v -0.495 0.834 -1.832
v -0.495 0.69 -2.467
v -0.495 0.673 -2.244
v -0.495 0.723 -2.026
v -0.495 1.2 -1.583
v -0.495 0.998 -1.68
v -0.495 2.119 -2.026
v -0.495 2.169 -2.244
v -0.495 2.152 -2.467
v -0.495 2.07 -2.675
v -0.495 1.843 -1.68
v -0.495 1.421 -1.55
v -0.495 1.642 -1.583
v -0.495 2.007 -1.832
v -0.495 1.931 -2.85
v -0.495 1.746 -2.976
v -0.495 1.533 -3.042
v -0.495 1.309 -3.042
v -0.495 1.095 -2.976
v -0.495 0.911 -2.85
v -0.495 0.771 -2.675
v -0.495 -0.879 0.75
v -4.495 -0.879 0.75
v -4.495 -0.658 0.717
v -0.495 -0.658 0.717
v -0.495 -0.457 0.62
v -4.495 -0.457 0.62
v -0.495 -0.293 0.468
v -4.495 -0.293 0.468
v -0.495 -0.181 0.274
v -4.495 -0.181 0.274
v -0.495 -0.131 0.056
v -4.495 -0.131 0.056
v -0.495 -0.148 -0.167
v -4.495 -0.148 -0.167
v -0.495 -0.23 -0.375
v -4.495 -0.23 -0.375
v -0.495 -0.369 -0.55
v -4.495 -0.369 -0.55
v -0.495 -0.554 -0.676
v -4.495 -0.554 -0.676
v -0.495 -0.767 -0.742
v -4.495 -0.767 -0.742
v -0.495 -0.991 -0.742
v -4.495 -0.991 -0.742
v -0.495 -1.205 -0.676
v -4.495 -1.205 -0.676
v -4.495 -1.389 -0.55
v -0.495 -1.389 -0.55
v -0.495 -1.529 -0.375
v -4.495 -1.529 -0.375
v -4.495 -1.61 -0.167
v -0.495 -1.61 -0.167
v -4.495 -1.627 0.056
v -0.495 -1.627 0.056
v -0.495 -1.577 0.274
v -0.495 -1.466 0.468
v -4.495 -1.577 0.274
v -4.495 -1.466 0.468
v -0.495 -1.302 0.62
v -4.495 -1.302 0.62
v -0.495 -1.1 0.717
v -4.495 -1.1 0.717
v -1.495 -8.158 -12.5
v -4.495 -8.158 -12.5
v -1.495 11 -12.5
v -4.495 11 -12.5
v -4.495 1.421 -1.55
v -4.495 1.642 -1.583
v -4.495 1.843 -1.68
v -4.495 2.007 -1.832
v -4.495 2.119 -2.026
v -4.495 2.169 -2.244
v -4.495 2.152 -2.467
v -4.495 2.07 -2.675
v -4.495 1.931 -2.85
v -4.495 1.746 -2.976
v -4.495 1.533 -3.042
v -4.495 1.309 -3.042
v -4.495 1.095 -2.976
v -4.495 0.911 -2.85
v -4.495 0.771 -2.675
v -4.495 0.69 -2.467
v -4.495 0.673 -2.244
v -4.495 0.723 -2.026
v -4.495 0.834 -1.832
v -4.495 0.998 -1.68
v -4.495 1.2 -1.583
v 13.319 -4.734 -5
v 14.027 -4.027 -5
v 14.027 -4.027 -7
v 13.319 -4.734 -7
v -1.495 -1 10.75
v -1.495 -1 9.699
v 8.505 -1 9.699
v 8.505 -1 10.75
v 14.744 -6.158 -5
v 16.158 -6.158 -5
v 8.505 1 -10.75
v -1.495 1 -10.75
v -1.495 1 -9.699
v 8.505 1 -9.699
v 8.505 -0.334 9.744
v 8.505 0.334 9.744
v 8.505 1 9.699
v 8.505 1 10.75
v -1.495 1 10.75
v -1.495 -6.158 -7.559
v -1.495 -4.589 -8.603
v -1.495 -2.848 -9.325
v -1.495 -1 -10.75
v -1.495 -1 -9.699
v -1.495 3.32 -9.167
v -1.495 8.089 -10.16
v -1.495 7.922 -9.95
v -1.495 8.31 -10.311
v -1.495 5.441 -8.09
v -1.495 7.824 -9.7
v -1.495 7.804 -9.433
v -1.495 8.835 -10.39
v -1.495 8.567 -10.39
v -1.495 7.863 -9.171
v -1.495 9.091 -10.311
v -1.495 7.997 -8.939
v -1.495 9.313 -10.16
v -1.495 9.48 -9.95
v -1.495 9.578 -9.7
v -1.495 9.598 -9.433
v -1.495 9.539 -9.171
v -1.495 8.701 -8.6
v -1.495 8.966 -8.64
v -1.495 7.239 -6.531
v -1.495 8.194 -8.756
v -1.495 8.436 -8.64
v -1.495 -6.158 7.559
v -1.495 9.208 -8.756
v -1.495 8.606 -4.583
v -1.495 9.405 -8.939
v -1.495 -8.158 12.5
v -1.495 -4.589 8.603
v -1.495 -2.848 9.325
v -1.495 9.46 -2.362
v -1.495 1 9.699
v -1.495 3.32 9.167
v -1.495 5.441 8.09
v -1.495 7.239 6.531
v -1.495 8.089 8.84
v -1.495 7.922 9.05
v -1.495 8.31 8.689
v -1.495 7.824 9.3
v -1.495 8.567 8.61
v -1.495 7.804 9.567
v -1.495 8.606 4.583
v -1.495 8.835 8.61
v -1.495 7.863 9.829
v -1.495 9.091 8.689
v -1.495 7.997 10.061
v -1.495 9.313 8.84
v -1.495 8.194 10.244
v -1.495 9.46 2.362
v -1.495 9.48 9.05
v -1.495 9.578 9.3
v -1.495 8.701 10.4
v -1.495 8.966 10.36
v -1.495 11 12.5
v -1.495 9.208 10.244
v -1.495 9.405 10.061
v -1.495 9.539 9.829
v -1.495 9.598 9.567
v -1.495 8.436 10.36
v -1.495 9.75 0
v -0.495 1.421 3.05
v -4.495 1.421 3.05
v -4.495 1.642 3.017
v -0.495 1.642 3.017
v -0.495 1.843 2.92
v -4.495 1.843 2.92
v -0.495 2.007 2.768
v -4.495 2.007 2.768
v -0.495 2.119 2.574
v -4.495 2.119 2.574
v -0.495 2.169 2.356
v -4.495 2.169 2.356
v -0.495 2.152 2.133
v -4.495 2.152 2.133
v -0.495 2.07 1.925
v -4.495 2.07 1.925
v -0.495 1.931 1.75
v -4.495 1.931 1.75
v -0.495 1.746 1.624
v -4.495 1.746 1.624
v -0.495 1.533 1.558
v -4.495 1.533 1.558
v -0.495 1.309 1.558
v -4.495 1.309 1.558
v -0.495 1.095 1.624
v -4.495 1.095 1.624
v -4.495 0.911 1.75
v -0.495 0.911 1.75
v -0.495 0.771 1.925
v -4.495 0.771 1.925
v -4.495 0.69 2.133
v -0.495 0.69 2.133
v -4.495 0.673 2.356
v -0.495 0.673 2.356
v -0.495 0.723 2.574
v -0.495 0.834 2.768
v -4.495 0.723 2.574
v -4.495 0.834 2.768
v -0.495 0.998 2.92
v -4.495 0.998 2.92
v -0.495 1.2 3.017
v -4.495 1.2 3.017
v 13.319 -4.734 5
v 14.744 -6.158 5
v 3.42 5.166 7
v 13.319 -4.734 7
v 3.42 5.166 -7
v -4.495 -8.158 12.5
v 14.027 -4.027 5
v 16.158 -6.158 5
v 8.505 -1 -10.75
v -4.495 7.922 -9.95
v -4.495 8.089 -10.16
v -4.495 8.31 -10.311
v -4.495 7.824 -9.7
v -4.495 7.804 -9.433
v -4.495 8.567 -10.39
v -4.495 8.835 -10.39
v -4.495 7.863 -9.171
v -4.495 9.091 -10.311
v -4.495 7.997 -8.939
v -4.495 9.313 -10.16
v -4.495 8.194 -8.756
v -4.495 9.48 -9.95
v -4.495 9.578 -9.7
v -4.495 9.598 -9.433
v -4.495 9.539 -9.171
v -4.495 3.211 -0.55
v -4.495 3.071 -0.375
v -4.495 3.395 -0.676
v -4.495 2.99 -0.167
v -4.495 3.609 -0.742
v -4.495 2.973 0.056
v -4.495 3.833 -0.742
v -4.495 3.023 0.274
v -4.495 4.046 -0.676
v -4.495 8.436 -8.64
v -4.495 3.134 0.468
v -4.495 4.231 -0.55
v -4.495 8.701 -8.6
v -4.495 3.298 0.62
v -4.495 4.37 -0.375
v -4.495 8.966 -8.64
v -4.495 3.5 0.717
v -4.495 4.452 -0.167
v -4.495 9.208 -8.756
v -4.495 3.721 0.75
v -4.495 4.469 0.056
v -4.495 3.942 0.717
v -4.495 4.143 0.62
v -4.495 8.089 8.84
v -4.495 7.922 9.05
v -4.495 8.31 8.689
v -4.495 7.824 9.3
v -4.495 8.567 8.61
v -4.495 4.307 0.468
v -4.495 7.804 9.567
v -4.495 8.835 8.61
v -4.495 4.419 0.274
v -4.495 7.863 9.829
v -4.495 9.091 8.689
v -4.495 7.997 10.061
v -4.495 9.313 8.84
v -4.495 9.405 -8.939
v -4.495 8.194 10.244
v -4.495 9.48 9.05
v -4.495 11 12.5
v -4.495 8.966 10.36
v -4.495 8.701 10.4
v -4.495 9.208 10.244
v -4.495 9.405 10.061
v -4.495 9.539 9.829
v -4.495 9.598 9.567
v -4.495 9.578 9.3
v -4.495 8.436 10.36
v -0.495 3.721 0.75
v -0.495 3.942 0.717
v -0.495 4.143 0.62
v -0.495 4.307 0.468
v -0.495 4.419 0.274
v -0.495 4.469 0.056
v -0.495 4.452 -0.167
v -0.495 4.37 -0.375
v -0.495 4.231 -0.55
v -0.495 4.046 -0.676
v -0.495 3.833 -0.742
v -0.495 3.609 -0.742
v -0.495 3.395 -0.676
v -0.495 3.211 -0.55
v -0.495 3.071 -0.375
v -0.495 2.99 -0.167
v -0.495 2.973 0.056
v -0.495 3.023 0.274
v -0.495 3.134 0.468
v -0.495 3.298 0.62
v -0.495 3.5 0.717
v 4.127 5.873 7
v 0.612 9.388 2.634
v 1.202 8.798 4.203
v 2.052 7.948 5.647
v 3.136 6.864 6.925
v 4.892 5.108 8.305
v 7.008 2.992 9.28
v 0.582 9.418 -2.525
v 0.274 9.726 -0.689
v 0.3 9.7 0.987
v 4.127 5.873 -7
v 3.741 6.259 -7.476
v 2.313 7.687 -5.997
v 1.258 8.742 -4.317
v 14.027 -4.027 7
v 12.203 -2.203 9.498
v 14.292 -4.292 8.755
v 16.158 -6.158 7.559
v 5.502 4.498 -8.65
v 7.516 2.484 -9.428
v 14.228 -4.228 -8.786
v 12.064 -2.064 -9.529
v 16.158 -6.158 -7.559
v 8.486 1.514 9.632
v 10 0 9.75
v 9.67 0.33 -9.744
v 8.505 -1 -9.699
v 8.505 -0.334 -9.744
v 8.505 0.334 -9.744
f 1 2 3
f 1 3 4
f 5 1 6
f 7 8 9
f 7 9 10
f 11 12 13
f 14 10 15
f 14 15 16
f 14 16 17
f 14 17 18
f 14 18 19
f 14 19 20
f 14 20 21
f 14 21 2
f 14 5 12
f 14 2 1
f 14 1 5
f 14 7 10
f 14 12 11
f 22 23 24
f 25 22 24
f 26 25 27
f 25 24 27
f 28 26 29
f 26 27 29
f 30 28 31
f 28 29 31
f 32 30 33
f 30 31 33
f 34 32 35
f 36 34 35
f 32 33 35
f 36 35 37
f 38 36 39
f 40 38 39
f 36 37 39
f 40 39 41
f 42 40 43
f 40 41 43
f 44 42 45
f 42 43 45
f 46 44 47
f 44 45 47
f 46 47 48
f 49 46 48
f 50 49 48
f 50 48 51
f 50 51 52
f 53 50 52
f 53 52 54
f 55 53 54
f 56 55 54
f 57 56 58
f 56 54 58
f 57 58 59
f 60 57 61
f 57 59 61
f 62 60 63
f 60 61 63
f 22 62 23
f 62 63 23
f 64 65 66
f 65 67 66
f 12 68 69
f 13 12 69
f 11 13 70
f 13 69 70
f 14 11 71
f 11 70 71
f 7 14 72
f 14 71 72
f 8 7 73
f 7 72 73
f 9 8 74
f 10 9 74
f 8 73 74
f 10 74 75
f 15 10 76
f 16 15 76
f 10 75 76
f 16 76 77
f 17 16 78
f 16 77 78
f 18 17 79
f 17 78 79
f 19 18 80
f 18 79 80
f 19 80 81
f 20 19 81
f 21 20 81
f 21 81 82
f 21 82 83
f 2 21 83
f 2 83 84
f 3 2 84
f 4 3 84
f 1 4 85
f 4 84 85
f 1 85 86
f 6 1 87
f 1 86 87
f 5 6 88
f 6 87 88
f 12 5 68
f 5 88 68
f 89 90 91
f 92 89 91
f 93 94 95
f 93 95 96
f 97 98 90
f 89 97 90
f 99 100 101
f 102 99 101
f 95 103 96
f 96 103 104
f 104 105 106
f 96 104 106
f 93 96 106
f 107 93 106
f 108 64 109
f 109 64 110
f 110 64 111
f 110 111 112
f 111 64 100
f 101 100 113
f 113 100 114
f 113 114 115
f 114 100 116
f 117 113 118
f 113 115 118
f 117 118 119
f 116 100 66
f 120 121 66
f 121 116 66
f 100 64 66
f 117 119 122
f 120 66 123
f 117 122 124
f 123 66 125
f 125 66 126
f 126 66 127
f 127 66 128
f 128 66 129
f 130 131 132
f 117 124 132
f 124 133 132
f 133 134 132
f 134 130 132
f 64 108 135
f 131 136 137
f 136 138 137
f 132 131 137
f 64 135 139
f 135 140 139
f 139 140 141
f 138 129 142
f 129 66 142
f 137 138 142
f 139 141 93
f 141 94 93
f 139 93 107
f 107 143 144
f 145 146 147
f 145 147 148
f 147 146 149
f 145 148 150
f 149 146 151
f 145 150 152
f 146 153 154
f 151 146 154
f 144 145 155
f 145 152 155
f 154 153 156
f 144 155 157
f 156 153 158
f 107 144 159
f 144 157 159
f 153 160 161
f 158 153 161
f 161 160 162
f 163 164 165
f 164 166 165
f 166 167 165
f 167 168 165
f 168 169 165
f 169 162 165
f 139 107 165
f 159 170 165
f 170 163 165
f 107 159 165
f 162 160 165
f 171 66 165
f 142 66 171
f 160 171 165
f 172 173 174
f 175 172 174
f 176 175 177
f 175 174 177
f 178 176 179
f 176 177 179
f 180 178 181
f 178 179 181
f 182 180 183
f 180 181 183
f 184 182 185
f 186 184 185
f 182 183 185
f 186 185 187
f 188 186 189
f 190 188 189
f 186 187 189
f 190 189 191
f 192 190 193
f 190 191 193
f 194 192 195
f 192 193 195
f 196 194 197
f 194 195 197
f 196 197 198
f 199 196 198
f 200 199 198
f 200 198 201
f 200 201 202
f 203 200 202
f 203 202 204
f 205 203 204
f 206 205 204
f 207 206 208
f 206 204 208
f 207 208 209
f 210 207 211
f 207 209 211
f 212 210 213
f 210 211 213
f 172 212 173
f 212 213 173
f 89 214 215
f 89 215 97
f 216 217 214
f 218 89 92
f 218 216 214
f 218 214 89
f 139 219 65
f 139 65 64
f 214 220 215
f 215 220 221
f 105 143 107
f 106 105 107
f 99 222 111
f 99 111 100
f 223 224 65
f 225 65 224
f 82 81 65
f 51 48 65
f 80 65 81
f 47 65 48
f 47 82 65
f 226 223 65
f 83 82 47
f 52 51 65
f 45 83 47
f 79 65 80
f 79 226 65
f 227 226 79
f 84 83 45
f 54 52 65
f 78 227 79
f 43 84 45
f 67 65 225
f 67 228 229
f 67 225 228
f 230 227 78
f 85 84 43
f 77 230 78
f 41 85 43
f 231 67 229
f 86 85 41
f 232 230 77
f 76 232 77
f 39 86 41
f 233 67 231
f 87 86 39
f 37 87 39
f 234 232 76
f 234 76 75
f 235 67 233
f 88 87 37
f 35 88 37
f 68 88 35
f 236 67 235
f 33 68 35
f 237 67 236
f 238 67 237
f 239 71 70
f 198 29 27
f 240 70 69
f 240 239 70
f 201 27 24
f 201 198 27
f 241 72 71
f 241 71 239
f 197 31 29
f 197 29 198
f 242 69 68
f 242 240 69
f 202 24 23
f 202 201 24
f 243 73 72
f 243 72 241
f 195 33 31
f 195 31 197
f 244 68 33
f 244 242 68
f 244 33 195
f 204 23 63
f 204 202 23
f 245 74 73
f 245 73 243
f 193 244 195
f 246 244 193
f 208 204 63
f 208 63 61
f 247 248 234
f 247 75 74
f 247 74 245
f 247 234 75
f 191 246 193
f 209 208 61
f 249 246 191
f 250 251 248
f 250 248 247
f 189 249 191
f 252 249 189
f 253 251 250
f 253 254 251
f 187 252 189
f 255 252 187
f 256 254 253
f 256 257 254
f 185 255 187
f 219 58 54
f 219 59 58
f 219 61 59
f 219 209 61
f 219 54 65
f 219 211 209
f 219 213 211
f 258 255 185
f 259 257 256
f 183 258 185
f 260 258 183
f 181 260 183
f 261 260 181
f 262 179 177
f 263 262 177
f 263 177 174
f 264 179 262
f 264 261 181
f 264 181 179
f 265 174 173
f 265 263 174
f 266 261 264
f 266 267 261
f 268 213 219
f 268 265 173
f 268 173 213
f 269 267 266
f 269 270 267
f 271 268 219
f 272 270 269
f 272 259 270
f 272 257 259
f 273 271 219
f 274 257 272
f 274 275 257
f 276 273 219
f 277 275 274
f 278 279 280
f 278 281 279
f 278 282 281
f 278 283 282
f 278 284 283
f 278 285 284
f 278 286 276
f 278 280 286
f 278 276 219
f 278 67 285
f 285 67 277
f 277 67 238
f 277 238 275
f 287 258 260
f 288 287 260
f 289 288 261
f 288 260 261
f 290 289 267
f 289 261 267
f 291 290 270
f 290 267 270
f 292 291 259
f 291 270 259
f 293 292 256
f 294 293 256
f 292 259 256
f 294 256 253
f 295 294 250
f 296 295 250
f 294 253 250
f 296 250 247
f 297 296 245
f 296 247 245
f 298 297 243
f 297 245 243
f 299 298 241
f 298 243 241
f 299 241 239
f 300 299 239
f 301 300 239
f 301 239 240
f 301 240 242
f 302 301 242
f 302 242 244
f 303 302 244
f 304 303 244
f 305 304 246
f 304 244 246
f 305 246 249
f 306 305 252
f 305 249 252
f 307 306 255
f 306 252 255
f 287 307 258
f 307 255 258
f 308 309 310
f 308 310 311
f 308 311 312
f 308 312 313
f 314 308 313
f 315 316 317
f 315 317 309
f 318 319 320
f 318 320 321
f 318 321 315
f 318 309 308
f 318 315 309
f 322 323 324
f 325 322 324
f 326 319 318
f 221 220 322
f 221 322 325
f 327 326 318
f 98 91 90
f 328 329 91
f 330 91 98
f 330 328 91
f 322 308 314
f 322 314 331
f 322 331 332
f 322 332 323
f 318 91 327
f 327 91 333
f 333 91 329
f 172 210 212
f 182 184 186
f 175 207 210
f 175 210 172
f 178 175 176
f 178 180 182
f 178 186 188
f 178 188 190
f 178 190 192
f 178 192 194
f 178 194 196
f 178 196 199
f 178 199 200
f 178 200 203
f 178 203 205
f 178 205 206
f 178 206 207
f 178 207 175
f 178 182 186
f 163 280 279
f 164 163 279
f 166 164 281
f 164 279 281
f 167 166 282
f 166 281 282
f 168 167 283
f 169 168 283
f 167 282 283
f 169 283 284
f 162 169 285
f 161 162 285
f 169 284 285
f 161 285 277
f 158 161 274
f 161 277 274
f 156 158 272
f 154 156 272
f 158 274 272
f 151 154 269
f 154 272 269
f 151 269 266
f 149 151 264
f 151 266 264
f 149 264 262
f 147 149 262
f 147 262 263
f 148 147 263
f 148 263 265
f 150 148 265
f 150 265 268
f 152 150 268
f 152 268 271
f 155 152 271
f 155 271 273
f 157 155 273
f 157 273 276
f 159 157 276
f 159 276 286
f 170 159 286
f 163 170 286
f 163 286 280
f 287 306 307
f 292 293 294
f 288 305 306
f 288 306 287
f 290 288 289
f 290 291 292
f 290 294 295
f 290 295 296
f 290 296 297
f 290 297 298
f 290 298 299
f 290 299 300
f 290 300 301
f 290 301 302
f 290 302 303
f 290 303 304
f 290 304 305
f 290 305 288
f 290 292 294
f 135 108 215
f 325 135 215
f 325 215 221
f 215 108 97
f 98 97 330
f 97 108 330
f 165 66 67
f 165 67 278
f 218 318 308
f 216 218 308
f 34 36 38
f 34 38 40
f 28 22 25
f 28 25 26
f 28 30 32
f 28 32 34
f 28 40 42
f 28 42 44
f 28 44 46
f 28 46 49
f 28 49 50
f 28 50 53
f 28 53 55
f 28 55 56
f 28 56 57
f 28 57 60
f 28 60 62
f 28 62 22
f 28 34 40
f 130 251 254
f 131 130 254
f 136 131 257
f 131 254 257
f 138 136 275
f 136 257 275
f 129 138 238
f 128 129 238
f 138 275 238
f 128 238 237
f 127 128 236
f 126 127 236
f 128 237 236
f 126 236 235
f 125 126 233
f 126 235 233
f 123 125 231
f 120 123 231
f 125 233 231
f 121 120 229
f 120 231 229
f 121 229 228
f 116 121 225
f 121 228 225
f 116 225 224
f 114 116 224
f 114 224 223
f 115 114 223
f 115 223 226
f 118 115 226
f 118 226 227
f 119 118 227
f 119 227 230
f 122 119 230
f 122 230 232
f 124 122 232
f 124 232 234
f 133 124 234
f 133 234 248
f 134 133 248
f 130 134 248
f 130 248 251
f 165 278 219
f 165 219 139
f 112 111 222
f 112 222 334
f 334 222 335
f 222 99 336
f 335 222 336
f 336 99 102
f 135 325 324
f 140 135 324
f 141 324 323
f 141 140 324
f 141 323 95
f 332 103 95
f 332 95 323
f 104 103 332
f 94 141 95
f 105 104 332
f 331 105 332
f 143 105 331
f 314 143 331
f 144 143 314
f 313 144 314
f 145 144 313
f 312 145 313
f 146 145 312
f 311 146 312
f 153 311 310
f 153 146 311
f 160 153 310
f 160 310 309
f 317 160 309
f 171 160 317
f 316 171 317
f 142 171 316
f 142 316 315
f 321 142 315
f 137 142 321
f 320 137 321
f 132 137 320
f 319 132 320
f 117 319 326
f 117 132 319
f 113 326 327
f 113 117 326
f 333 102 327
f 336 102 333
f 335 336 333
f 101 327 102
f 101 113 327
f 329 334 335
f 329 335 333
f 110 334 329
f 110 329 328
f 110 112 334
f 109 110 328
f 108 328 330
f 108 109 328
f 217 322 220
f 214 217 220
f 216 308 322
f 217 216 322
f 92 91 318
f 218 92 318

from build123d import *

# Parameters (mm, degrees)
SKETCH_1_W               = 31.418685122
SKETCH_1_H               = 20
EXTRUDE_1_DEPTH          = 20
CUT_EXTRUDE_1_DEPTH      = 40
SKETCH_5_OUTSIDE_W       = 44.348
SKETCH_5_OUTSIDE_H       = 32.93
SKETCH_5_OUTSIDE_R       = 9.75
CUT_EXTRUDE_2_DEPTH      = 45.122368972
CUT_EXTRUDE_3_DEPTH      = 1
SKETCH_6_R               = 9.75
CUT_EXTRUDE_4_DEPTH      = 18.50523648
SKETCH_7_W               = 25
SKETCH_7_H               = 22
EXTRUDE_2_DEPTH          = 3
CUT_EXTRUDE_5_DEPTH      = 25.793531221
CUT_EXTRUDE_5_DEPTH_BACK = 25.793531221
SKETCH_8_W               = 31.739015686
SKETCH_8_H               = 6.741185812
SKETCH_9_W               = 2
SKETCH_9_H               = 2
EXTRUDE_3_DEPTH          = 13
SKETCH_10_W              = 3
SKETCH_10_H              = 25
EXTRUDE_4_DEPTH          = 2
SKETCH_11_R              = 0.75
CUT_EXTRUDE_6_DEPTH      = 4
SKETCH_13_R              = 0.9
CUT_EXTRUDE_7_DEPTH      = 27.529322999


with BuildPart() as part:
    # 草图1 → 凸台-拉伸1 (new, symmetric)
    with BuildSketch(Plane(origin=(0, 0, 0), x_dir=(0, 0, -1), z_dir=(1, 0, 0))):
        Rectangle(SKETCH_1_W, SKETCH_1_H)
    extrude(amount=EXTRUDE_1_DEPTH, both=True)

    # 草图2 → 切除-拉伸1 (cut)
    with BuildSketch(Plane(origin=(0, 0, -15.709342561), x_dir=(-1, 0, 0), z_dir=(0, 0, -1))):
        Polygon((-20, 10), (0, 10), (-20, -10), align=None)
    extrude(amount=-CUT_EXTRUDE_1_DEPTH, mode=Mode.SUBTRACT)

    # 草图5 outside → 切除-拉伸2 (cut, through all)
    with BuildSketch(Plane.ZY.offset(20)):
        Rectangle(SKETCH_5_OUTSIDE_W, SKETCH_5_OUTSIDE_H)
        Circle(SKETCH_5_OUTSIDE_R, mode=Mode.SUBTRACT)
    extrude(amount=-CUT_EXTRUDE_2_DEPTH, mode=Mode.SUBTRACT)

    # 草图3 → 切除-拉伸3 (cut)
    with BuildSketch(Plane(origin=(5, 5, 0), x_dir=(0, 0, -1), z_dir=(0.7071067811865477, 0.7071067811865475, 0))):
        Polygon((-7, -12.765541439), (-5, -12.765541439), (-5, -21.213203436), (5, -21.213203436), (5, -12.765541439), (7, -12.765541439), (7, 1.234458561), (-7, 1.234458561), align=None)
    extrude(amount=-CUT_EXTRUDE_3_DEPTH, mode=Mode.SUBTRACT)

    # 草图6 → 切除-拉伸4 (cut)
    with BuildSketch(Plane.ZY.offset(20)):
        Circle(SKETCH_6_R)
    extrude(amount=-CUT_EXTRUDE_4_DEPTH, mode=Mode.SUBTRACT)

    # 草图7 → 凸台-拉伸2 (add)
    with BuildSketch(Plane.ZY.offset(1.49476352)):
        Rectangle(SKETCH_7_W, SKETCH_7_H)
    extrude(amount=EXTRUDE_2_DEPTH)

    # 草图8 → 切除-拉伸5 (cut, two sides: drawn at the far end of the back side and taken through both)
    with BuildSketch(Plane.XY.offset(-CUT_EXTRUDE_5_DEPTH_BACK)):
        with Locations((7.322399495, -9.529036855)):
            Rectangle(SKETCH_8_W, SKETCH_8_H)
    extrude(amount=CUT_EXTRUDE_5_DEPTH + CUT_EXTRUDE_5_DEPTH_BACK, mode=Mode.SUBTRACT)

    # 草图9 → 凸台-拉伸3 (add)
    with BuildSketch(Plane.ZY.offset(4.49476352)):
        with Locations((-9.75, 0)):
            Rectangle(SKETCH_9_W, SKETCH_9_H)
        with Locations((9.75, 0)):
            Rectangle(SKETCH_9_W, SKETCH_9_H)
    extrude(amount=-EXTRUDE_3_DEPTH)

    # 草图10 → 凸台-拉伸4 (add)
    with BuildSketch(Plane.XZ.offset(6.158443949)):
        with Locations((-2.99476352, 0)):
            Rectangle(SKETCH_10_W, SKETCH_10_H)
    extrude(amount=EXTRUDE_4_DEPTH)

    # 草图11 → 切除-拉伸6 (cut)
    with BuildSketch(Plane.ZY.offset(4.49476352)):
        with Locations((0, 3.720778025)):
            Circle(SKETCH_11_R)
        with Locations((2.3, 1.420778025)):
            Circle(SKETCH_11_R)
        with Locations((0, -0.879221975)):
            Circle(SKETCH_11_R)
        with Locations((-2.3, 1.420778025)):
            Circle(SKETCH_11_R)
    extrude(amount=-CUT_EXTRUDE_6_DEPTH, mode=Mode.SUBTRACT)

    # 草图13 → 切除-拉伸7 (cut, through all)
    with BuildSketch(Plane.ZY.offset(4.49476352)):
        with Locations((-9.5, 8.700986726)):
            Circle(SKETCH_13_R)
        with Locations((9.5, 8.700986726)):
            Circle(SKETCH_13_R)
    extrude(amount=-CUT_EXTRUDE_7_DEPTH, mode=Mode.SUBTRACT)


solid = part.part
